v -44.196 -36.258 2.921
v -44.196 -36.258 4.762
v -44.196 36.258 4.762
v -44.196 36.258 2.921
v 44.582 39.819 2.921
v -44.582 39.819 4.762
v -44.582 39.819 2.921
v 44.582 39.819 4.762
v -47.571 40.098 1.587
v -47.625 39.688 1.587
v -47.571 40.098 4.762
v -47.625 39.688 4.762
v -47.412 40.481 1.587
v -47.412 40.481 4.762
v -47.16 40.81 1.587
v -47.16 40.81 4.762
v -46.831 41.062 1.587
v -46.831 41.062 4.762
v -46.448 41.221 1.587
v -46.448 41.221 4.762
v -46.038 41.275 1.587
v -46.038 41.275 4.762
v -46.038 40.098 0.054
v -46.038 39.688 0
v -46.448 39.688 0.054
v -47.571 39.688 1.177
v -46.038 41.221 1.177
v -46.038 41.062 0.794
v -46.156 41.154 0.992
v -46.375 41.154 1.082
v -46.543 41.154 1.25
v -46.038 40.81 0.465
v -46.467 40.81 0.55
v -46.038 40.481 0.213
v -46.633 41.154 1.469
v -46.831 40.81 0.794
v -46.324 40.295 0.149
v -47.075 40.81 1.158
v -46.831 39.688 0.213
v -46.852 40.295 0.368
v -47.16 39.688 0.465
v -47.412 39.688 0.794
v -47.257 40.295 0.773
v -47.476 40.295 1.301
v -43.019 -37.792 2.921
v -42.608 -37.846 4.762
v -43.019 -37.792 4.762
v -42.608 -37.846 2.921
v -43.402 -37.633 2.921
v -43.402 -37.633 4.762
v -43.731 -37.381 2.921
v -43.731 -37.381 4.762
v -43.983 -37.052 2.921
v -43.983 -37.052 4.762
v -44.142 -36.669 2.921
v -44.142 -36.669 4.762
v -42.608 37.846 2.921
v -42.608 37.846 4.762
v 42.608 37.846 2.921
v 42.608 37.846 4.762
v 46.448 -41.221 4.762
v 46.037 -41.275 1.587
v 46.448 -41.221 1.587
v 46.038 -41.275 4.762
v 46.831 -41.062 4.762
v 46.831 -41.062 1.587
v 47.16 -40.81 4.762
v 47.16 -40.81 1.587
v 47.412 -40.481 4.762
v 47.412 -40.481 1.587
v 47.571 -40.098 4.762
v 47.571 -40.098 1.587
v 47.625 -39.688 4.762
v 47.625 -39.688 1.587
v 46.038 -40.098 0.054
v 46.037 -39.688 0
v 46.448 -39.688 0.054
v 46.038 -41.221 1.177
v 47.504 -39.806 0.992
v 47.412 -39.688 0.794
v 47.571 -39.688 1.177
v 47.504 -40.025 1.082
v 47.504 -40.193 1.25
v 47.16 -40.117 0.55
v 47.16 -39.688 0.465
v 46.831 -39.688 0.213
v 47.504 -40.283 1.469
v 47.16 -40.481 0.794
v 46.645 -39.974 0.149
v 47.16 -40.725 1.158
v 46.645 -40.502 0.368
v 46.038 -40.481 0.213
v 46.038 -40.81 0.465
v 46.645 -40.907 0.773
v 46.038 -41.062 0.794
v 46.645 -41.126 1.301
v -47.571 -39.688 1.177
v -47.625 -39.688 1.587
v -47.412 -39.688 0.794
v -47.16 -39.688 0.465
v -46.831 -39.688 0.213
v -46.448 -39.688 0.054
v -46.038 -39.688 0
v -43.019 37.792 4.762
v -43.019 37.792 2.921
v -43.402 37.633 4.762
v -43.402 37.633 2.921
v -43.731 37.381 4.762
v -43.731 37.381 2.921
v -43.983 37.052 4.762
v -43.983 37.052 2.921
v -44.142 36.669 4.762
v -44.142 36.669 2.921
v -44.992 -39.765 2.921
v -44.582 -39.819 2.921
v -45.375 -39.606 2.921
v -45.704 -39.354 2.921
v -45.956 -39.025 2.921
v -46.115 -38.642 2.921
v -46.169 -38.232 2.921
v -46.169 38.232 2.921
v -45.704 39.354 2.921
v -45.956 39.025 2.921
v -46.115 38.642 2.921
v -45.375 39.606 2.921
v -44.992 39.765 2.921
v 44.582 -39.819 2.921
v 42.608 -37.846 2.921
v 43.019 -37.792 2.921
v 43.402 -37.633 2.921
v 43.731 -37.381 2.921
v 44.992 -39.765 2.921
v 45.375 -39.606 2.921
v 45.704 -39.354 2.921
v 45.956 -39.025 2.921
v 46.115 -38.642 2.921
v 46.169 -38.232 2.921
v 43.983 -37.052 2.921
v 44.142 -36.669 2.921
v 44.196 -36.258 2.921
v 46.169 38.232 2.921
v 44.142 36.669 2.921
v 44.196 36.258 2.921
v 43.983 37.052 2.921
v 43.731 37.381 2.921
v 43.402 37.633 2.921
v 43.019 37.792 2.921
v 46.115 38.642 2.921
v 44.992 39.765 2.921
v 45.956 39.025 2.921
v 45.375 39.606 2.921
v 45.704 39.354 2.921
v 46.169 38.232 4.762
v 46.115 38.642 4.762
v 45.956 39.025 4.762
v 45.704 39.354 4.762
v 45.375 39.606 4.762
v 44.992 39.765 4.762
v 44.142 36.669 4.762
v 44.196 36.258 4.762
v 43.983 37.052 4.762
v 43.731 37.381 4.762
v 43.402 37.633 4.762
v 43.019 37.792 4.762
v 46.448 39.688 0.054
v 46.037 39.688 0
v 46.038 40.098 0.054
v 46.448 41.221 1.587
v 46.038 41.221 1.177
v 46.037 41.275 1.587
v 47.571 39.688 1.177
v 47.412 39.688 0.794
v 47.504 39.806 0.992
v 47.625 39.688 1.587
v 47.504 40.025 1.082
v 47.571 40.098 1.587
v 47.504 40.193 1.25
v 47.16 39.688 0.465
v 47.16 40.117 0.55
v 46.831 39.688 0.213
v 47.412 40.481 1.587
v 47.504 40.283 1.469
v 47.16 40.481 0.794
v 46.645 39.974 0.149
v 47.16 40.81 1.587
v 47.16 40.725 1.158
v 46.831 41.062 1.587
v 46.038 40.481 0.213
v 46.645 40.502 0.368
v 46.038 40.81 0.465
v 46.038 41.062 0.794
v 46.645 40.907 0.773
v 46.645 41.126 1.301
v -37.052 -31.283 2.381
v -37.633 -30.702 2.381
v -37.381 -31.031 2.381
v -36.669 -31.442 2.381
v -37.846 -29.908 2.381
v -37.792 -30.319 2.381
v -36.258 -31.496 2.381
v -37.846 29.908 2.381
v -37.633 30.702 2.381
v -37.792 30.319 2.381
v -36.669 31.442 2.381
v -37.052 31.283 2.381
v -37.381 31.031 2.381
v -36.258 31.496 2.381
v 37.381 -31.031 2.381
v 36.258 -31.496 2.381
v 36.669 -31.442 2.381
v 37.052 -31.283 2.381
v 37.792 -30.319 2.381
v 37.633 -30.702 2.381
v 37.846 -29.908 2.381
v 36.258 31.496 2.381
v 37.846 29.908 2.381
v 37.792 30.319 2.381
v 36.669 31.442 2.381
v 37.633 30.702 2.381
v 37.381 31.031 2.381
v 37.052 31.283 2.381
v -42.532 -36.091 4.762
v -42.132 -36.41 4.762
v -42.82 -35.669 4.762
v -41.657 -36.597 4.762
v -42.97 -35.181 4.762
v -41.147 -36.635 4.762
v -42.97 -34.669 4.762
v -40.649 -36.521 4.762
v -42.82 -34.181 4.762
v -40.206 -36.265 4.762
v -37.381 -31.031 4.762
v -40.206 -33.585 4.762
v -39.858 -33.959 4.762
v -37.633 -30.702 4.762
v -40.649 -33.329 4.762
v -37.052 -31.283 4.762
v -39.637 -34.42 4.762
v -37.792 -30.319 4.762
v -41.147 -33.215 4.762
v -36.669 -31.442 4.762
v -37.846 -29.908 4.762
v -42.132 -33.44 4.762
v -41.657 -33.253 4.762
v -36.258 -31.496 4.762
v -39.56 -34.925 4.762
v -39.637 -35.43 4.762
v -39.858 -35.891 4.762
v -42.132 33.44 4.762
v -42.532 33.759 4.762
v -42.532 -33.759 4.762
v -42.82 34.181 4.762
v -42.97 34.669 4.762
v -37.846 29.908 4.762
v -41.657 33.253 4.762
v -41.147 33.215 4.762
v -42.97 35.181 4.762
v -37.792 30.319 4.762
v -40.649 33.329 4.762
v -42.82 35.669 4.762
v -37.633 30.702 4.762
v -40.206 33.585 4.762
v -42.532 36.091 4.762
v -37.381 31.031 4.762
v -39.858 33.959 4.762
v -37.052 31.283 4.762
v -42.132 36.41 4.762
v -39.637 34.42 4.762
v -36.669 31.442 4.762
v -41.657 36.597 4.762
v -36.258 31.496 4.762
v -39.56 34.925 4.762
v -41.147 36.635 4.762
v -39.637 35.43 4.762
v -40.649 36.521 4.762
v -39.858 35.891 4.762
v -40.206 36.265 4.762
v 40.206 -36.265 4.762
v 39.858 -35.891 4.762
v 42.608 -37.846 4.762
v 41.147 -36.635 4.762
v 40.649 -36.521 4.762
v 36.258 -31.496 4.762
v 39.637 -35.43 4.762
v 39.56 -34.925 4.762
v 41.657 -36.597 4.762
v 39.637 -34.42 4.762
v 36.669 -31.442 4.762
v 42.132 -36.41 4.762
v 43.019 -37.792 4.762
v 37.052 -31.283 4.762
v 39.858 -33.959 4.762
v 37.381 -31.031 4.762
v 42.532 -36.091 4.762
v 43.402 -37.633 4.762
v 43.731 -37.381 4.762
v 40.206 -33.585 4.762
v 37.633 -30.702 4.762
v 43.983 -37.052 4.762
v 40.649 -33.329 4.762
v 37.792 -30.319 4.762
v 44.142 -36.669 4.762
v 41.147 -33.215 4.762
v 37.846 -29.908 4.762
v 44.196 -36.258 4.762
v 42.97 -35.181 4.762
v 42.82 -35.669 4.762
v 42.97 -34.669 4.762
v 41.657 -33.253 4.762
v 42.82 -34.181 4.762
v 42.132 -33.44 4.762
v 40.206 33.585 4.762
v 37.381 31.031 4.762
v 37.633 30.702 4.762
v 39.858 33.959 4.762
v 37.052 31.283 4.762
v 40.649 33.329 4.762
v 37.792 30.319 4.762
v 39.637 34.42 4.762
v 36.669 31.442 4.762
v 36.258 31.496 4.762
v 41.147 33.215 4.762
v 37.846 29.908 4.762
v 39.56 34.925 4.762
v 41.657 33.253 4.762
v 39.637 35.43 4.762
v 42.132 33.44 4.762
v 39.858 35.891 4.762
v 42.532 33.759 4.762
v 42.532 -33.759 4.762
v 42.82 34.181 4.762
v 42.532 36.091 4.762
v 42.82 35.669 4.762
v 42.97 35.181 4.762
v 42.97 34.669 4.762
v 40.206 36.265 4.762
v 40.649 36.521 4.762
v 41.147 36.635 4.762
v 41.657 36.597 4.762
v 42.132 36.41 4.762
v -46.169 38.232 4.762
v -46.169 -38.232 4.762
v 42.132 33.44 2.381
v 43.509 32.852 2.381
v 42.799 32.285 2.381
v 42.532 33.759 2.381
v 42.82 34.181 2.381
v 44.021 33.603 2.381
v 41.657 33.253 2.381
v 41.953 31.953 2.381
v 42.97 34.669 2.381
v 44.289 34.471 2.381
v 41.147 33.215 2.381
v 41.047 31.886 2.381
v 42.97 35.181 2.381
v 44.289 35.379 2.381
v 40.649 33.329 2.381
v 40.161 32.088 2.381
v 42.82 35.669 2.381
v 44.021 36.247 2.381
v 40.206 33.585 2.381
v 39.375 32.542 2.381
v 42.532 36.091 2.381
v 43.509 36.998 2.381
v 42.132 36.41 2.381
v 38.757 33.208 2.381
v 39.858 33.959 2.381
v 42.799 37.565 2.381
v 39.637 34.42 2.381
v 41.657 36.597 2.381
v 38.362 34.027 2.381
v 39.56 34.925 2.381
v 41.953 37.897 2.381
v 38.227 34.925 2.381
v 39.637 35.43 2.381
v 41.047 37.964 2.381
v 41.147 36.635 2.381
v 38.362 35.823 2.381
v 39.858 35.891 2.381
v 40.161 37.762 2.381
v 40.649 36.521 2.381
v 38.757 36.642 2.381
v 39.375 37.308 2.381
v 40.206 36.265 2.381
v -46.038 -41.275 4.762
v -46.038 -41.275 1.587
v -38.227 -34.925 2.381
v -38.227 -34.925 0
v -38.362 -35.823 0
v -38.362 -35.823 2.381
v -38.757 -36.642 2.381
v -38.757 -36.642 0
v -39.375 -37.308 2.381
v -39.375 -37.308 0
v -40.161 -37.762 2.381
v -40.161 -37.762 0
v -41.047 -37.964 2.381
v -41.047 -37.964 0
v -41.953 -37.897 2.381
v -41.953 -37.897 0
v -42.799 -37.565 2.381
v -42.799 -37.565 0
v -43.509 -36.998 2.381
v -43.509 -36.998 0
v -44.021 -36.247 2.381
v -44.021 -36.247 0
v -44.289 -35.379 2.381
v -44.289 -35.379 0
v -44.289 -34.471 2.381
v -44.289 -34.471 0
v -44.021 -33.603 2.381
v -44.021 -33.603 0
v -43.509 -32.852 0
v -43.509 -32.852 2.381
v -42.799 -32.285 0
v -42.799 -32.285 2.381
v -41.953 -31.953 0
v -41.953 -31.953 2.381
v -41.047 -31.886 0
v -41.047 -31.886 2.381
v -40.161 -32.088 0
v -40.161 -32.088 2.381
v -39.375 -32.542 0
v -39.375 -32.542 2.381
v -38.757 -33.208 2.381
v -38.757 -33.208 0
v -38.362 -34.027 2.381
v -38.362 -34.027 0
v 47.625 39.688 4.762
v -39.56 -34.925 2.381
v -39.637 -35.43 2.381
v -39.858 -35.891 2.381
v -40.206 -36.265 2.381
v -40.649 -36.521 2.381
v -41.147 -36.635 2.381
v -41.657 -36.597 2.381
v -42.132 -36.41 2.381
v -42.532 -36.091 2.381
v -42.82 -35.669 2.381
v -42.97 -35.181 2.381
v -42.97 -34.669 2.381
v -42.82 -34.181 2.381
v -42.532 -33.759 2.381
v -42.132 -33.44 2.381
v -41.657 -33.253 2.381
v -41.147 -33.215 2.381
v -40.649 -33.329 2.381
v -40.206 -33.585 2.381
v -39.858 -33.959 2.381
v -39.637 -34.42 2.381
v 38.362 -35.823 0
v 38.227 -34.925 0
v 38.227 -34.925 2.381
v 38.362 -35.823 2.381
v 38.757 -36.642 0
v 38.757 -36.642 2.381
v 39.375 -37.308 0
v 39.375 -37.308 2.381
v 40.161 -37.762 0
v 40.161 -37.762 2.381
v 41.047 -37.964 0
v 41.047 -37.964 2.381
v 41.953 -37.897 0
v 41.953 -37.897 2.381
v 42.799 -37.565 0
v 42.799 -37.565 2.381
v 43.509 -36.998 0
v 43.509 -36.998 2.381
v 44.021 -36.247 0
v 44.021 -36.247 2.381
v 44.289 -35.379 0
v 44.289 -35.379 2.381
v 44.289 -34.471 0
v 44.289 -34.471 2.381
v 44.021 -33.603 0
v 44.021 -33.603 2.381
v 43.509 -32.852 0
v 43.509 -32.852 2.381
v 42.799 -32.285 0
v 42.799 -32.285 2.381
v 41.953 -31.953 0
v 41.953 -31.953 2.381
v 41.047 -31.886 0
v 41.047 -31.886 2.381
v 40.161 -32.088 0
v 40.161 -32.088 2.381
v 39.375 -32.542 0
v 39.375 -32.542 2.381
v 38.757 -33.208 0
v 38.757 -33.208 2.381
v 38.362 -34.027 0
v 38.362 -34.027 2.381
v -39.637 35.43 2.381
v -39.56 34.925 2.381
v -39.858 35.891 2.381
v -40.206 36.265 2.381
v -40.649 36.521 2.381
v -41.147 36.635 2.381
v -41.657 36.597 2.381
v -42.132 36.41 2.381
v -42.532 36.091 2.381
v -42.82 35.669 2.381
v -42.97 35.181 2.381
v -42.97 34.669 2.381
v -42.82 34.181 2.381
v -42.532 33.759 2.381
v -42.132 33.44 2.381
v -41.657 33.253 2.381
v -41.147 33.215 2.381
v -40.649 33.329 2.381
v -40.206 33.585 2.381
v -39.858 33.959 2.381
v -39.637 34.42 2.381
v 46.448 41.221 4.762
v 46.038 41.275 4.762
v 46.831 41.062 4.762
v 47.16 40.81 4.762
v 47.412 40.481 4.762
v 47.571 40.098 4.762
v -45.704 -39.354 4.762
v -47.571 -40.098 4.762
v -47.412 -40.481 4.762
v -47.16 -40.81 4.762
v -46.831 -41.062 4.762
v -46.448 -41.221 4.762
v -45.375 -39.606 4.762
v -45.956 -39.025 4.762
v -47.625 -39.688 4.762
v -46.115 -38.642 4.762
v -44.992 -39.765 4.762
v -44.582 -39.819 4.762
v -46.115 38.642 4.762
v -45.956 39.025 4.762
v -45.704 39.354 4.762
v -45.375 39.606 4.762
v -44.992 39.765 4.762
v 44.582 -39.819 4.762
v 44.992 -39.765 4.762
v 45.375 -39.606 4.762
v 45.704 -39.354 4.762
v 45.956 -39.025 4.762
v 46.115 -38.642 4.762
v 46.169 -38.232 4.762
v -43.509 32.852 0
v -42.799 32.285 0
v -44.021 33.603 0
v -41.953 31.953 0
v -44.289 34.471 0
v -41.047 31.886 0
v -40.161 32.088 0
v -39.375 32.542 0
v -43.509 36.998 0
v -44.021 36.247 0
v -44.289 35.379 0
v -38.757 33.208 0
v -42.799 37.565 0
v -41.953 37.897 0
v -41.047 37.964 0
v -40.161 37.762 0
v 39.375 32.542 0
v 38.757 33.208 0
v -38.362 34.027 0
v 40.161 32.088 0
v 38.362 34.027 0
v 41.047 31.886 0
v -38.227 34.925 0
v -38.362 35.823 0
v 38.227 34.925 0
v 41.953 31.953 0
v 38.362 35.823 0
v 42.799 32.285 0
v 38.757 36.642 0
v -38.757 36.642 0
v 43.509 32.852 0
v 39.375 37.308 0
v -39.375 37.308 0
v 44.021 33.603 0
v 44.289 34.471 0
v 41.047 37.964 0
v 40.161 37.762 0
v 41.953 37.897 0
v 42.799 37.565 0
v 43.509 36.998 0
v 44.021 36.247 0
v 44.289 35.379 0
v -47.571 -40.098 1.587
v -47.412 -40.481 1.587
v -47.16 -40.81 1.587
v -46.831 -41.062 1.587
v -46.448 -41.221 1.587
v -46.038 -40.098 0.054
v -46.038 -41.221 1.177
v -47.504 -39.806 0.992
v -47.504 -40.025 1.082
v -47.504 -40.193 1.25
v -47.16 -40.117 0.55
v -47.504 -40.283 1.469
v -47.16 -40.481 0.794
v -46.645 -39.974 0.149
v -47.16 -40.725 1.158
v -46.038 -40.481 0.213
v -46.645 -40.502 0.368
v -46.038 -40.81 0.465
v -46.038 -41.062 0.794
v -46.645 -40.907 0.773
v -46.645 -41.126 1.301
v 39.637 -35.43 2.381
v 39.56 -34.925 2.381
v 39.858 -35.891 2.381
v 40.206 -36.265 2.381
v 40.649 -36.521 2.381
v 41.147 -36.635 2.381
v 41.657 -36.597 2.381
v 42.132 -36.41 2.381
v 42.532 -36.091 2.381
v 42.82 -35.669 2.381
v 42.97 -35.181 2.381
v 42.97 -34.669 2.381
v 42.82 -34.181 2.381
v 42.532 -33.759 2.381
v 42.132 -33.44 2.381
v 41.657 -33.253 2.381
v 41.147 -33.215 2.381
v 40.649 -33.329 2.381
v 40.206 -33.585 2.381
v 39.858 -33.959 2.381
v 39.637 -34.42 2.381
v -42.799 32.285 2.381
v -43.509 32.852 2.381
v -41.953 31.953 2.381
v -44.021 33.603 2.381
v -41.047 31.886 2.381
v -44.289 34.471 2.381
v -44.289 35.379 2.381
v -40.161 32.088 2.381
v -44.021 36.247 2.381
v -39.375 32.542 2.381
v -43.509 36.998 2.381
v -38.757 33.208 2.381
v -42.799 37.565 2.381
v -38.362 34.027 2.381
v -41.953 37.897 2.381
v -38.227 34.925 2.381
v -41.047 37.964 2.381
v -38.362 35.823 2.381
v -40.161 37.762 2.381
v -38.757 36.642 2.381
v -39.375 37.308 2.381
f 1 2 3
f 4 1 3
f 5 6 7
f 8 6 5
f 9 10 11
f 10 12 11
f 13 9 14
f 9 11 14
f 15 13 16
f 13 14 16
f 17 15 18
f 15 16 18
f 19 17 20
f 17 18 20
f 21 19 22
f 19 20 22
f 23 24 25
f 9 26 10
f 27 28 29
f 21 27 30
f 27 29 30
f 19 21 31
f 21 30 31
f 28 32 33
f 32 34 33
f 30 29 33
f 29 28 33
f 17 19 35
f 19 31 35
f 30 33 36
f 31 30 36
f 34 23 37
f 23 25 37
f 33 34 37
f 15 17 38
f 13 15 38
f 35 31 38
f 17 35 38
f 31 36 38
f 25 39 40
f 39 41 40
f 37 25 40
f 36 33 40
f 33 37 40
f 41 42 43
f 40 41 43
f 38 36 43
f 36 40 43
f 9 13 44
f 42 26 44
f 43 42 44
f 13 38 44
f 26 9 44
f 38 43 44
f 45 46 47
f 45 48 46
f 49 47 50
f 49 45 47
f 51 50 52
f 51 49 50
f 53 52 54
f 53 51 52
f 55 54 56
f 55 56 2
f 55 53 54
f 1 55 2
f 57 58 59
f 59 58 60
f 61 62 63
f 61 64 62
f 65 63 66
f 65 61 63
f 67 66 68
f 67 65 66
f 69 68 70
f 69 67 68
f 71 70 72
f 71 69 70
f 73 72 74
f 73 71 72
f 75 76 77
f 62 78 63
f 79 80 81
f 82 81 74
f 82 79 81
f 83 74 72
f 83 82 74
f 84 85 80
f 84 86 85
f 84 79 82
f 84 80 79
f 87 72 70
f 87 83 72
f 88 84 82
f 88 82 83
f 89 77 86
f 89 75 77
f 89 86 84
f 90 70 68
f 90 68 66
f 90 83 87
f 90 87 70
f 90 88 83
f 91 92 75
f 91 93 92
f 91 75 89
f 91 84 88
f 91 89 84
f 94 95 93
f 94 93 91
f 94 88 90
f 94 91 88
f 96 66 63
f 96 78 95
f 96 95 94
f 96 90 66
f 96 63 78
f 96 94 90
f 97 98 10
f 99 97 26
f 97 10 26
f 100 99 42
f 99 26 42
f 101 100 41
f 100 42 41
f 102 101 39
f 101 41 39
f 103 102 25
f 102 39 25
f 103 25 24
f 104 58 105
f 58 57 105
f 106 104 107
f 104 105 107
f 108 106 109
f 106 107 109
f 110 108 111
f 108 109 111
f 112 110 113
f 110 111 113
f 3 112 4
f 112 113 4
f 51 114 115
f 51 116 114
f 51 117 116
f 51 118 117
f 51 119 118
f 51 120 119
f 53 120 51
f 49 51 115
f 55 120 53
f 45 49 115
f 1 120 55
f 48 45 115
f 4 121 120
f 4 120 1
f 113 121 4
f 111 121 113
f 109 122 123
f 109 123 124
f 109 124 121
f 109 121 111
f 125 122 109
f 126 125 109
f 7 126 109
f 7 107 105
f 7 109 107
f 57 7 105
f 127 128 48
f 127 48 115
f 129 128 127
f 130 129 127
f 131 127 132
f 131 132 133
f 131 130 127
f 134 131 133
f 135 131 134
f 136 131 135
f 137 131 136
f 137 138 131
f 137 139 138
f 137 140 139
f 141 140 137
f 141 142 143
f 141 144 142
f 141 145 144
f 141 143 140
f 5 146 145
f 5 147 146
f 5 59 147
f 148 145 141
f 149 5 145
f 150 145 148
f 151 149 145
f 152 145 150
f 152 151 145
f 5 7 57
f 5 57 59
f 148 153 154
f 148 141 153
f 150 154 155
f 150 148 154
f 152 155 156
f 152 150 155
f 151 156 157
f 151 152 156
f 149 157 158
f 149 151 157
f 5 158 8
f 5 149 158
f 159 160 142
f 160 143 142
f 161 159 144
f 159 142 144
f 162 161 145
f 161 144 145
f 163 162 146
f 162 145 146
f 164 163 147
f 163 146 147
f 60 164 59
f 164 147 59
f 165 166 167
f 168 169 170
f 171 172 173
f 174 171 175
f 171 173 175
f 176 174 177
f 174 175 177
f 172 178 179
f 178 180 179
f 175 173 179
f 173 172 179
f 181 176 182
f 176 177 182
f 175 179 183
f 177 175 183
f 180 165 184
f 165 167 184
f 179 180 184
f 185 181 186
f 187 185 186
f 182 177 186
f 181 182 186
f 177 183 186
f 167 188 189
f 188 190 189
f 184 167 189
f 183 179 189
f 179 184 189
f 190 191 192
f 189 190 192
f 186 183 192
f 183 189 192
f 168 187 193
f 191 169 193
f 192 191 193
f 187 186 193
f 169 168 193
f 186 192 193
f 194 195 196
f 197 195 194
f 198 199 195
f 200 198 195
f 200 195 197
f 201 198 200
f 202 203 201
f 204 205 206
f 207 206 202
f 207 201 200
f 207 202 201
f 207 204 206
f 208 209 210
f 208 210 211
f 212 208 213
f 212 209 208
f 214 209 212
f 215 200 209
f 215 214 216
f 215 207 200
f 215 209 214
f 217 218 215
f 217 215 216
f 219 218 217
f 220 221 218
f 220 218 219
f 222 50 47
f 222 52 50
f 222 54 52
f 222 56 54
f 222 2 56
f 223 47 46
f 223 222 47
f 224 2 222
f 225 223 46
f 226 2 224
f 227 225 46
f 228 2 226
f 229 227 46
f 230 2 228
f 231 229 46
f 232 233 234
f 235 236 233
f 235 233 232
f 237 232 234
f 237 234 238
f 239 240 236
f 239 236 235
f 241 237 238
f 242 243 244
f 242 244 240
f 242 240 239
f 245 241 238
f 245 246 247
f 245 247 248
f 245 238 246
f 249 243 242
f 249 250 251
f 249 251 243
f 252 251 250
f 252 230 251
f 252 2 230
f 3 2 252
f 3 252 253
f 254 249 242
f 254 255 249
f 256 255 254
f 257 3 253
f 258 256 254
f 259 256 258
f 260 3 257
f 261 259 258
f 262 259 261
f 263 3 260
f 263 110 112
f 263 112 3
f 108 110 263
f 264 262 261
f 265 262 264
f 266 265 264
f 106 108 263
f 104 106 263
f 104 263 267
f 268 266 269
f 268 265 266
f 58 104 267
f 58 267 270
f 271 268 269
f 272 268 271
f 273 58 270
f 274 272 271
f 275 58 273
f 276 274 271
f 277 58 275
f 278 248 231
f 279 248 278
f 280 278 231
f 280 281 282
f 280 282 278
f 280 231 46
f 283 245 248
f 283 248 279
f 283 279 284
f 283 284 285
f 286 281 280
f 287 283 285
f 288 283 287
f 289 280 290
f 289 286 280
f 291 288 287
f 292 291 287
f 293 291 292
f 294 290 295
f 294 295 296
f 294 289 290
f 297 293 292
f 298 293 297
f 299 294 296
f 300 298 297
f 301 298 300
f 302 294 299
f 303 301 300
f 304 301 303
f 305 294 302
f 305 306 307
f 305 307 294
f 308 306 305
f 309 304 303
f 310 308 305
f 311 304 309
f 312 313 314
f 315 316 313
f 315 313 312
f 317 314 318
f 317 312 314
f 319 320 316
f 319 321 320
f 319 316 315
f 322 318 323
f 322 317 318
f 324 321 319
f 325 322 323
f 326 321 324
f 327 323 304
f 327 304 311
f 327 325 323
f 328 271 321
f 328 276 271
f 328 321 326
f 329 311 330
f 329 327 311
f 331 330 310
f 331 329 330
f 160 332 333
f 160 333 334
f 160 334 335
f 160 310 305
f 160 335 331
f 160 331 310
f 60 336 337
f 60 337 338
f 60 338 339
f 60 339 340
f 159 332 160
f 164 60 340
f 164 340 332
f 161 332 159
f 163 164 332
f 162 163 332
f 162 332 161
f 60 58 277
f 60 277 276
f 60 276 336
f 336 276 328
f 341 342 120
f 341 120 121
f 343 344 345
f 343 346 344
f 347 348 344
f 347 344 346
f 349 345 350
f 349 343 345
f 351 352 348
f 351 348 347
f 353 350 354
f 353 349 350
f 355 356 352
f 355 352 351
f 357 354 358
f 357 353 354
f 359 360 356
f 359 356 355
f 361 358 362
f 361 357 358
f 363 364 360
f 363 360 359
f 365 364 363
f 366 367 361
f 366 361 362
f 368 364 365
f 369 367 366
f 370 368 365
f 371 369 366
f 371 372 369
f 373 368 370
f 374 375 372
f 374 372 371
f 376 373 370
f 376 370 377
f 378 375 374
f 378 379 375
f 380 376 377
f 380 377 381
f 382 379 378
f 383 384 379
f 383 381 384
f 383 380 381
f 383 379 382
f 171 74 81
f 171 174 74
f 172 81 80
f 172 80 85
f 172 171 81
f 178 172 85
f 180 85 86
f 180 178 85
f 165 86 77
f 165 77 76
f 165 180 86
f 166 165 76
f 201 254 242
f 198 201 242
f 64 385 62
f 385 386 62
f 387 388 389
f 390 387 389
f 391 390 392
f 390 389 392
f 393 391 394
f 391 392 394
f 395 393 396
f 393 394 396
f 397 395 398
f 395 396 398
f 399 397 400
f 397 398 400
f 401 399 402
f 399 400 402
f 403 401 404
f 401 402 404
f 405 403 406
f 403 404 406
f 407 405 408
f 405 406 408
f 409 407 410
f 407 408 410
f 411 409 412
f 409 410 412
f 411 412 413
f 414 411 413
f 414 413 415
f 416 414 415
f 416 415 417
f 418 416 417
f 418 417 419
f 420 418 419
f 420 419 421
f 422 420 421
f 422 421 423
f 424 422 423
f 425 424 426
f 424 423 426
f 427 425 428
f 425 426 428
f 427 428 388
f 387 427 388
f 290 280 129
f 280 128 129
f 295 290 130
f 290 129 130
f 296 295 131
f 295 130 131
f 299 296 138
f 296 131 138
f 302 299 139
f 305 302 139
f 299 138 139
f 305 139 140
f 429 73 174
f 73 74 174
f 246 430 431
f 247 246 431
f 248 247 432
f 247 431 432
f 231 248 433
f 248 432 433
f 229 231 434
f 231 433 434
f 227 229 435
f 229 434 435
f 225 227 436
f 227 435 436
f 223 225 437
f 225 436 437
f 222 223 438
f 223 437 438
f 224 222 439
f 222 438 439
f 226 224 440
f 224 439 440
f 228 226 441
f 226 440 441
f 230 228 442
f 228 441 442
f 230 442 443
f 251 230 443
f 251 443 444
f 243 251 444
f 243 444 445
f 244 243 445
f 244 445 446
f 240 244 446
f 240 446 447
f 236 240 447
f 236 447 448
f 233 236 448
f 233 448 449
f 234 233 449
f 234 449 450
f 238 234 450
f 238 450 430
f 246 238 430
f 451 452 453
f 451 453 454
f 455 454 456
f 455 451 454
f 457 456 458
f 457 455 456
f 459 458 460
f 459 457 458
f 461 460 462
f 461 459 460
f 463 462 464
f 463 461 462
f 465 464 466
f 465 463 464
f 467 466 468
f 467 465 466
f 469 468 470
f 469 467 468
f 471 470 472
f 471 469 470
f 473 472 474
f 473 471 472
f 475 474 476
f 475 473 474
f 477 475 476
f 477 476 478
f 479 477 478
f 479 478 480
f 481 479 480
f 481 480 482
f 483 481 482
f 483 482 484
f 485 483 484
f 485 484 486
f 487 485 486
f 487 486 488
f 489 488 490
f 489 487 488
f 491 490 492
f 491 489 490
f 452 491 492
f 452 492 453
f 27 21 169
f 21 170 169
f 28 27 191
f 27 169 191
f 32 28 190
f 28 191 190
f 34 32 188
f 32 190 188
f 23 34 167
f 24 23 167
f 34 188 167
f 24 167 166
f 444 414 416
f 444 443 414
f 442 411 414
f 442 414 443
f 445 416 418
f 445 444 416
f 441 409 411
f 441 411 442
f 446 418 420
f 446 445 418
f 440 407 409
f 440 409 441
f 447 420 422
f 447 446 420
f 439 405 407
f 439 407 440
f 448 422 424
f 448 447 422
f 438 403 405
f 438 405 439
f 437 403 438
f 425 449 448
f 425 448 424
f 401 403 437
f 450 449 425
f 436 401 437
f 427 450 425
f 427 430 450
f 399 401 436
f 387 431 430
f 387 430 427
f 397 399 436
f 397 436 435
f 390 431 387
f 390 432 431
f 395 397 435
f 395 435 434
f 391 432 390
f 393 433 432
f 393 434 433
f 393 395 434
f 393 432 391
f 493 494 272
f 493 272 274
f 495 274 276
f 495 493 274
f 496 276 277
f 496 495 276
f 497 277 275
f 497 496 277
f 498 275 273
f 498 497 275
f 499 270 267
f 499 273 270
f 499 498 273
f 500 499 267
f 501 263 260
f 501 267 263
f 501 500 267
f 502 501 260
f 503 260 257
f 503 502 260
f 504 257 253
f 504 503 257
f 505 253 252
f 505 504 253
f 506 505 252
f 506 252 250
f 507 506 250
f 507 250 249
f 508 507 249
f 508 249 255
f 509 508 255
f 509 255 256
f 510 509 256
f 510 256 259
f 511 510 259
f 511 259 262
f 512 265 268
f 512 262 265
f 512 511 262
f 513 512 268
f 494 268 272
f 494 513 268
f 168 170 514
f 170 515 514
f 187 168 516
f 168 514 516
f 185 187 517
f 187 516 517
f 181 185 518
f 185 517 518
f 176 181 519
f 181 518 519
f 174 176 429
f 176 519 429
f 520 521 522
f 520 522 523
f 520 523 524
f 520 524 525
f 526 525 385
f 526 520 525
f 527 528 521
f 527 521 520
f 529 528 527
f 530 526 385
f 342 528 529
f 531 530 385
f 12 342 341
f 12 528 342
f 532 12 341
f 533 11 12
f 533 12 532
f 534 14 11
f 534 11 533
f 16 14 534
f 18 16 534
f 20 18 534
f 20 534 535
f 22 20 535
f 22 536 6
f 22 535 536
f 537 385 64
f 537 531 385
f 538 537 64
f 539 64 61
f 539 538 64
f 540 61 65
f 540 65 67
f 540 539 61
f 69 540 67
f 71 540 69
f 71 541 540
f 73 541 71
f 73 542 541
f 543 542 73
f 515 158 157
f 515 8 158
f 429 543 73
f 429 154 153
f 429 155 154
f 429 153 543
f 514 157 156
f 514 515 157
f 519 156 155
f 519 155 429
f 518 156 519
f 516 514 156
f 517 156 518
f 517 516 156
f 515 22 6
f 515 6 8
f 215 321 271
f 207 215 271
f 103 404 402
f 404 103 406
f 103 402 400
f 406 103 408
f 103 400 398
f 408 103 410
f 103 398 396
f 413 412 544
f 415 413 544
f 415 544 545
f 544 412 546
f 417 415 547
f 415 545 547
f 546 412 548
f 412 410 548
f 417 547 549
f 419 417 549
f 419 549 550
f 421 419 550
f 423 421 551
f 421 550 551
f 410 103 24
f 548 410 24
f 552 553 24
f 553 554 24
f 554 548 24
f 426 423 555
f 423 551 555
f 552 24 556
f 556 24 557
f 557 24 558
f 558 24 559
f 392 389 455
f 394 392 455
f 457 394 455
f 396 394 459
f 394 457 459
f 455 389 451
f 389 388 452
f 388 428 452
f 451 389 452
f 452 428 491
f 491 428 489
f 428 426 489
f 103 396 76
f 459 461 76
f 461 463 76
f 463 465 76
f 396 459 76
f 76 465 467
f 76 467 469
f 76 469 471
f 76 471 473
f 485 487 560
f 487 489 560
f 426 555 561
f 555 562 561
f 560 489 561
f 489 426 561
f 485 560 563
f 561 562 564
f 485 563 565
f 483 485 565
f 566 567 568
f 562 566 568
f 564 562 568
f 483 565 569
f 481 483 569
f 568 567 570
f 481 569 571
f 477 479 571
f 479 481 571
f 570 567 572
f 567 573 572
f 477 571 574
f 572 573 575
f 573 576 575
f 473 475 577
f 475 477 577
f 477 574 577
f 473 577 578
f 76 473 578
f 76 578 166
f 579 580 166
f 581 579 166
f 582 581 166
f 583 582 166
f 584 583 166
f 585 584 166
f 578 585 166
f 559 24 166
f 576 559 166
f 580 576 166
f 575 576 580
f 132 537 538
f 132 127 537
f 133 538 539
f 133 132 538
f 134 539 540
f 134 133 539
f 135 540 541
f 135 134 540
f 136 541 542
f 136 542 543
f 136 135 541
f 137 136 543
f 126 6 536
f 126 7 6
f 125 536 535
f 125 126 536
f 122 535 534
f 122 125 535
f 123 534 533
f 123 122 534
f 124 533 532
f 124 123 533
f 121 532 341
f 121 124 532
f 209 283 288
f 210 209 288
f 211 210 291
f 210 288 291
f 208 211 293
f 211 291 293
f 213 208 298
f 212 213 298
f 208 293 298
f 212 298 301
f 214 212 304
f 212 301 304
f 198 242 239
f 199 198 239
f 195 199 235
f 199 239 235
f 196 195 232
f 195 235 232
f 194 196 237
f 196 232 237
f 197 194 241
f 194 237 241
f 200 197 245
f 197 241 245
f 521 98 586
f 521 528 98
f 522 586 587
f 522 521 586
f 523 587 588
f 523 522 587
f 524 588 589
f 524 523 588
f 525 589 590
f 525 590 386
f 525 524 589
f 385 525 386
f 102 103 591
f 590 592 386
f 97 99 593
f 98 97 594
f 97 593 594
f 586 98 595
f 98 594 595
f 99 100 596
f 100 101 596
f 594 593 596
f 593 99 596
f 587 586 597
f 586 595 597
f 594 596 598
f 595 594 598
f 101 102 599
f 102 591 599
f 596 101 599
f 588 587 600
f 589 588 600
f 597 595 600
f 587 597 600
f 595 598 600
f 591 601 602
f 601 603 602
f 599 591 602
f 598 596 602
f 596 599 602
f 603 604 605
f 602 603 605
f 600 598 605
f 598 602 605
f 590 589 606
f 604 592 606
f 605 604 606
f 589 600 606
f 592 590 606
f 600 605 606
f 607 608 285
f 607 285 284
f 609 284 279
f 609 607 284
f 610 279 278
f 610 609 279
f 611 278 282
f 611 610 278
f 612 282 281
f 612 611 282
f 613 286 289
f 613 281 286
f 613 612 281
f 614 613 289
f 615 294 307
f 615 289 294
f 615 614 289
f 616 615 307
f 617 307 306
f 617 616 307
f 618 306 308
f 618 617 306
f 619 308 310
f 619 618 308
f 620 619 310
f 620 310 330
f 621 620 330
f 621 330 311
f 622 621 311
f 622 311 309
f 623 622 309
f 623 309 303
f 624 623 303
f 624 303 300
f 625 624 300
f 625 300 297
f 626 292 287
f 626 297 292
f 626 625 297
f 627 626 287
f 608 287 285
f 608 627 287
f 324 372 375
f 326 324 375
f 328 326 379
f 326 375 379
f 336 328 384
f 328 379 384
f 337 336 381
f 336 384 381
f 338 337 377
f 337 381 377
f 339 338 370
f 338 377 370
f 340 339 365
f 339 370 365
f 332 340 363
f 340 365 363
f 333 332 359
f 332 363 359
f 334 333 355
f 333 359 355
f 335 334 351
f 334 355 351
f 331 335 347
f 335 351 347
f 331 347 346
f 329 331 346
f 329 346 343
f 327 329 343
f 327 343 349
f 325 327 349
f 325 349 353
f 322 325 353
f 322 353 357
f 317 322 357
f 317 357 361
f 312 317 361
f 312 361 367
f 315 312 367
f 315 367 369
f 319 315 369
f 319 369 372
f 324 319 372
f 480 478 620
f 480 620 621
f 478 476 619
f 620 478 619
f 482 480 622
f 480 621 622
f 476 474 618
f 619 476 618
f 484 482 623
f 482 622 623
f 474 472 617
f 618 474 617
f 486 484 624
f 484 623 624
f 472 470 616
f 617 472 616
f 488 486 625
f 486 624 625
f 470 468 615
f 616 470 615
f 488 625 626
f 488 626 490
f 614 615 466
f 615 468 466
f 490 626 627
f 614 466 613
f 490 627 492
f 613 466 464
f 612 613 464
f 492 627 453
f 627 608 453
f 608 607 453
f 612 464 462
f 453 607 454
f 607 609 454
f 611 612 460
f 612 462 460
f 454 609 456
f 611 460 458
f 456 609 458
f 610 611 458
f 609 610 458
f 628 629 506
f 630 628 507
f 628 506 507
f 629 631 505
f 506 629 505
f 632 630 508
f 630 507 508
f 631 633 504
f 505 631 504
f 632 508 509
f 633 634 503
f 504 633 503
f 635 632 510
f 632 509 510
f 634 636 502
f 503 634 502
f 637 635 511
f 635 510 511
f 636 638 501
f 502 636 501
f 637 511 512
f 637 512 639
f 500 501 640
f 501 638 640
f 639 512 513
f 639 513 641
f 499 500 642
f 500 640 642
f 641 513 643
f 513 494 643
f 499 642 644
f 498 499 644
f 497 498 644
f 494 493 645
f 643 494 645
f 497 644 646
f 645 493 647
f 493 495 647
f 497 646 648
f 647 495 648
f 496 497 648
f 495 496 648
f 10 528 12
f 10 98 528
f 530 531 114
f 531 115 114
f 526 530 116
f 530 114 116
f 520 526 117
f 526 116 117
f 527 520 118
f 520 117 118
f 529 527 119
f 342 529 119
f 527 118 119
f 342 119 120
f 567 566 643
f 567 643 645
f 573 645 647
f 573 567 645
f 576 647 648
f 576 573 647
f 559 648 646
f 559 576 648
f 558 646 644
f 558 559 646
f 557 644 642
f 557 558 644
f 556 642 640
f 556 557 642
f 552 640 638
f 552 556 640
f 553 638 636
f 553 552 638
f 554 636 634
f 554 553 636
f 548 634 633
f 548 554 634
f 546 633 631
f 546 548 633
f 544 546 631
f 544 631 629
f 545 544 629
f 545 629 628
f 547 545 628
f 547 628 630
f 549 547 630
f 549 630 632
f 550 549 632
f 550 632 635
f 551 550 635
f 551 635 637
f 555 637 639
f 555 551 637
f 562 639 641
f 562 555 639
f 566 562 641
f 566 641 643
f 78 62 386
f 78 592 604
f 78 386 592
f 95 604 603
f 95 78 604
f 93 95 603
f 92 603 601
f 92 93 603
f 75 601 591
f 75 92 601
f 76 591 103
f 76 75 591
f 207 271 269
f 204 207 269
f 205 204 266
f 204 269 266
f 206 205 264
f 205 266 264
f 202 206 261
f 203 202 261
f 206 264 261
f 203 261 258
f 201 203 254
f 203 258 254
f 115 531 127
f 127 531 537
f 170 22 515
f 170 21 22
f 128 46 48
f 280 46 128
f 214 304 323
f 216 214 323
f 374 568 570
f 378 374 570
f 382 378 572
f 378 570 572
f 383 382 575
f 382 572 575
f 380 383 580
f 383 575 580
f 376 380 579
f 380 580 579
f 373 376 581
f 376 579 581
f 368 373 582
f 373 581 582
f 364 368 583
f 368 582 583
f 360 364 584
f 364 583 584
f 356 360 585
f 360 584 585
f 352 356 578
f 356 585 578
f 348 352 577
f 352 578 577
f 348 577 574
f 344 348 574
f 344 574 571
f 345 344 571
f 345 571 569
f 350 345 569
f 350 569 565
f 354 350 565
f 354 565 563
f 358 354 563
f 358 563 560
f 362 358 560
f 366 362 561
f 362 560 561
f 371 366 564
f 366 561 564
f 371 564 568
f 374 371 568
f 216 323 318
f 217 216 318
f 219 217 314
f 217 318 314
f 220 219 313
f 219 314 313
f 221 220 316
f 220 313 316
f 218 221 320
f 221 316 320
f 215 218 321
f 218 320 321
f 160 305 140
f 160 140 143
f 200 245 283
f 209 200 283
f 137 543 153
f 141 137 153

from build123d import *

# Parameters (mm, degrees)
SKETCH1_W                                  = 95.25
SKETCH1_H                                  = 82.55
BOSS_EXTRUDE1_DEPTH                        = 4.7625
SKETCH2_W                                  = 92.338000236
SKETCH2_H                                  = 79.638
SKETCH2_W_2                                = 88.392
SKETCH2_H_2                                = 75.692
CUT_EXTRUDE1_DEPTH                         = 1.8415
FILLET1_R                                  = 1.5875
FILLET2_R                                  = 1.5875
SKETCH3_R                                  = 1.7145
CUT_EXTRUDE2_DEPTH                         = 64.201642829
SKETCH4_R                                  = 3.048
CUT_EXTRUDE3_DEPTH                         = 2.38125
MIRROR1_AT_THE_SECOND_PLANE_COPY_1_SKETC_R = 1.7145
MIRROR1_AT_THE_SECOND_PLANE_COPY_1_DEPTH   = 64.201642829
MIRROR1_AT_THE_SECOND_PLANE_COPY_2_SKETC_R = 3.048
MIRROR1_AT_THE_SECOND_PLANE_COPY_2_DEPTH   = 2.38125
CUT_EXTRUDE4_DEPTH                         = 2.38125


with BuildPart() as part:
    # Sketch1 → Boss-Extrude1 (new body)
    with BuildSketch(Plane.XY):
        Rectangle(SKETCH1_W, SKETCH1_H)
    extrude(amount=BOSS_EXTRUDE1_DEPTH)

    # Sketch2 → Cut-Extrude1 (cut)
    with BuildSketch(Plane.XY.offset(4.7625)):
        Rectangle(SKETCH2_W, SKETCH2_H)
        Rectangle(SKETCH2_W_2, SKETCH2_H_2, mode=Mode.SUBTRACT)
    extrude(amount=-CUT_EXTRUDE1_DEPTH, mode=Mode.SUBTRACT)

    # Fillet1
    fillet1_edges = [part.edges().sort_by_distance(p)[0] for p in [
        (46.169000118, 39.819, 3.84175),
        (46.169000118, -39.819, 3.84175),
        (-46.169000118, -39.819, 3.84175),
        (-46.169000118, 39.819, 3.84175),
        (44.196, -37.846, 3.84175),
        (-44.196, -37.846, 3.84175),
        (-44.196, 37.846, 3.84175),
        (44.196, 37.846, 3.84175),
    ]]
    fillet(fillet1_edges, radius=FILLET1_R)

    # Fillet2
    fillet2_edges = [part.edges().sort_by_distance(p)[0] for p in [
        (0, -41.275, 0),
        (-47.625, 0, 0),
        (0, 41.275, 0),
        (47.625, 0, 0),
        (47.625, -41.275, 2.38125),
        (-47.625, -41.275, 2.38125),
        (-47.625, 41.275, 2.38125),
        (47.625, 41.275, 2.38125),
    ]]
    fillet(fillet2_edges, radius=FILLET2_R)

    # Sketch3 → Cut-Extrude2 (cut, through all)
    with BuildSketch(Plane(origin=(0, 0, 0), x_dir=(-1, 0, 0), z_dir=(0, 0, -1))):
        with Locations((-41.275, 34.925)):
            Circle(SKETCH3_R)
    cut_extrude2 = extrude(amount=-CUT_EXTRUDE2_DEPTH, mode=Mode.SUBTRACT)

    # Sketch4 → Cut-Extrude3 (cut)
    with BuildSketch(Plane(origin=(0, 0, 0), x_dir=(-1, 0, 0), z_dir=(0, 0, -1))):
        with Locations((-41.275, 34.925)):
            Circle(SKETCH4_R)
    cut_extrude3 = extrude(amount=-CUT_EXTRUDE3_DEPTH, mode=Mode.SUBTRACT)

    # Mirror1: Cut-Extrude2, Cut-Extrude3 across plane
    add(cut_extrude2.mirror(Plane(origin=(0, 0, 0), x_dir=(0, 0, 1), z_dir=(1, 0, 0))), mode=Mode.SUBTRACT)
    add(cut_extrude3.mirror(Plane(origin=(0, 0, 0), x_dir=(0, 0, 1), z_dir=(1, 0, 0))), mode=Mode.SUBTRACT)

    # Mirror1 at the second plane: Cut-Extrude2, Cut-Extrude3 across plane
    add(cut_extrude2.mirror(Plane.ZX), mode=Mode.SUBTRACT)
    add(cut_extrude3.mirror(Plane.ZX), mode=Mode.SUBTRACT)

    # Mirror1 at the second plane copy 1 sketc → Mirror1 at the second plane copy 1 (cut, through all)
    with BuildSketch(Plane(origin=(0, 0, 0), x_dir=(1, 0, 0), z_dir=(0, 0, -1))):
        with Locations((-41.275, 34.925)):
            Circle(MIRROR1_AT_THE_SECOND_PLANE_COPY_1_SKETC_R)
    extrude(amount=-MIRROR1_AT_THE_SECOND_PLANE_COPY_1_DEPTH, mode=Mode.SUBTRACT)

    # Mirror1 at the second plane copy 2 sketc → Mirror1 at the second plane copy 2 (cut)
    with BuildSketch(Plane(origin=(0, 0, 0), x_dir=(1, 0, 0), z_dir=(0, 0, -1))):
        with Locations((-41.275, 34.925)):
            Circle(MIRROR1_AT_THE_SECOND_PLANE_COPY_2_SKETC_R)
    extrude(amount=-MIRROR1_AT_THE_SECOND_PLANE_COPY_2_DEPTH, mode=Mode.SUBTRACT)

    # Sketch5 → Cut-Extrude4 (cut)
    with BuildSketch(Plane.XY.offset(4.7625)):
        with BuildLine():
            Line((-36.2585, -31.496), (36.2585, -31.496))
            ThreePointArc((36.2585, -31.496), (37.381032015, -31.031032015), (37.846, -29.9085))
            Line((37.846, -29.9085), (37.846, 29.9085))
            ThreePointArc((37.846, 29.9085), (37.381032015, 31.031032015), (36.2585, 31.496))
            Line((36.2585, 31.496), (-36.2585, 31.496))
            ThreePointArc((-36.2585, 31.496), (-37.381032015, 31.031032015), (-37.846, 29.9085))
            Line((-37.846, 29.9085), (-37.846, -29.9085))
            ThreePointArc((-37.846, -29.9085), (-37.381032015, -31.031032015), (-36.2585, -31.496))
        make_face()
    extrude(amount=-CUT_EXTRUDE4_DEPTH, mode=Mode.SUBTRACT)


solid = part.part
